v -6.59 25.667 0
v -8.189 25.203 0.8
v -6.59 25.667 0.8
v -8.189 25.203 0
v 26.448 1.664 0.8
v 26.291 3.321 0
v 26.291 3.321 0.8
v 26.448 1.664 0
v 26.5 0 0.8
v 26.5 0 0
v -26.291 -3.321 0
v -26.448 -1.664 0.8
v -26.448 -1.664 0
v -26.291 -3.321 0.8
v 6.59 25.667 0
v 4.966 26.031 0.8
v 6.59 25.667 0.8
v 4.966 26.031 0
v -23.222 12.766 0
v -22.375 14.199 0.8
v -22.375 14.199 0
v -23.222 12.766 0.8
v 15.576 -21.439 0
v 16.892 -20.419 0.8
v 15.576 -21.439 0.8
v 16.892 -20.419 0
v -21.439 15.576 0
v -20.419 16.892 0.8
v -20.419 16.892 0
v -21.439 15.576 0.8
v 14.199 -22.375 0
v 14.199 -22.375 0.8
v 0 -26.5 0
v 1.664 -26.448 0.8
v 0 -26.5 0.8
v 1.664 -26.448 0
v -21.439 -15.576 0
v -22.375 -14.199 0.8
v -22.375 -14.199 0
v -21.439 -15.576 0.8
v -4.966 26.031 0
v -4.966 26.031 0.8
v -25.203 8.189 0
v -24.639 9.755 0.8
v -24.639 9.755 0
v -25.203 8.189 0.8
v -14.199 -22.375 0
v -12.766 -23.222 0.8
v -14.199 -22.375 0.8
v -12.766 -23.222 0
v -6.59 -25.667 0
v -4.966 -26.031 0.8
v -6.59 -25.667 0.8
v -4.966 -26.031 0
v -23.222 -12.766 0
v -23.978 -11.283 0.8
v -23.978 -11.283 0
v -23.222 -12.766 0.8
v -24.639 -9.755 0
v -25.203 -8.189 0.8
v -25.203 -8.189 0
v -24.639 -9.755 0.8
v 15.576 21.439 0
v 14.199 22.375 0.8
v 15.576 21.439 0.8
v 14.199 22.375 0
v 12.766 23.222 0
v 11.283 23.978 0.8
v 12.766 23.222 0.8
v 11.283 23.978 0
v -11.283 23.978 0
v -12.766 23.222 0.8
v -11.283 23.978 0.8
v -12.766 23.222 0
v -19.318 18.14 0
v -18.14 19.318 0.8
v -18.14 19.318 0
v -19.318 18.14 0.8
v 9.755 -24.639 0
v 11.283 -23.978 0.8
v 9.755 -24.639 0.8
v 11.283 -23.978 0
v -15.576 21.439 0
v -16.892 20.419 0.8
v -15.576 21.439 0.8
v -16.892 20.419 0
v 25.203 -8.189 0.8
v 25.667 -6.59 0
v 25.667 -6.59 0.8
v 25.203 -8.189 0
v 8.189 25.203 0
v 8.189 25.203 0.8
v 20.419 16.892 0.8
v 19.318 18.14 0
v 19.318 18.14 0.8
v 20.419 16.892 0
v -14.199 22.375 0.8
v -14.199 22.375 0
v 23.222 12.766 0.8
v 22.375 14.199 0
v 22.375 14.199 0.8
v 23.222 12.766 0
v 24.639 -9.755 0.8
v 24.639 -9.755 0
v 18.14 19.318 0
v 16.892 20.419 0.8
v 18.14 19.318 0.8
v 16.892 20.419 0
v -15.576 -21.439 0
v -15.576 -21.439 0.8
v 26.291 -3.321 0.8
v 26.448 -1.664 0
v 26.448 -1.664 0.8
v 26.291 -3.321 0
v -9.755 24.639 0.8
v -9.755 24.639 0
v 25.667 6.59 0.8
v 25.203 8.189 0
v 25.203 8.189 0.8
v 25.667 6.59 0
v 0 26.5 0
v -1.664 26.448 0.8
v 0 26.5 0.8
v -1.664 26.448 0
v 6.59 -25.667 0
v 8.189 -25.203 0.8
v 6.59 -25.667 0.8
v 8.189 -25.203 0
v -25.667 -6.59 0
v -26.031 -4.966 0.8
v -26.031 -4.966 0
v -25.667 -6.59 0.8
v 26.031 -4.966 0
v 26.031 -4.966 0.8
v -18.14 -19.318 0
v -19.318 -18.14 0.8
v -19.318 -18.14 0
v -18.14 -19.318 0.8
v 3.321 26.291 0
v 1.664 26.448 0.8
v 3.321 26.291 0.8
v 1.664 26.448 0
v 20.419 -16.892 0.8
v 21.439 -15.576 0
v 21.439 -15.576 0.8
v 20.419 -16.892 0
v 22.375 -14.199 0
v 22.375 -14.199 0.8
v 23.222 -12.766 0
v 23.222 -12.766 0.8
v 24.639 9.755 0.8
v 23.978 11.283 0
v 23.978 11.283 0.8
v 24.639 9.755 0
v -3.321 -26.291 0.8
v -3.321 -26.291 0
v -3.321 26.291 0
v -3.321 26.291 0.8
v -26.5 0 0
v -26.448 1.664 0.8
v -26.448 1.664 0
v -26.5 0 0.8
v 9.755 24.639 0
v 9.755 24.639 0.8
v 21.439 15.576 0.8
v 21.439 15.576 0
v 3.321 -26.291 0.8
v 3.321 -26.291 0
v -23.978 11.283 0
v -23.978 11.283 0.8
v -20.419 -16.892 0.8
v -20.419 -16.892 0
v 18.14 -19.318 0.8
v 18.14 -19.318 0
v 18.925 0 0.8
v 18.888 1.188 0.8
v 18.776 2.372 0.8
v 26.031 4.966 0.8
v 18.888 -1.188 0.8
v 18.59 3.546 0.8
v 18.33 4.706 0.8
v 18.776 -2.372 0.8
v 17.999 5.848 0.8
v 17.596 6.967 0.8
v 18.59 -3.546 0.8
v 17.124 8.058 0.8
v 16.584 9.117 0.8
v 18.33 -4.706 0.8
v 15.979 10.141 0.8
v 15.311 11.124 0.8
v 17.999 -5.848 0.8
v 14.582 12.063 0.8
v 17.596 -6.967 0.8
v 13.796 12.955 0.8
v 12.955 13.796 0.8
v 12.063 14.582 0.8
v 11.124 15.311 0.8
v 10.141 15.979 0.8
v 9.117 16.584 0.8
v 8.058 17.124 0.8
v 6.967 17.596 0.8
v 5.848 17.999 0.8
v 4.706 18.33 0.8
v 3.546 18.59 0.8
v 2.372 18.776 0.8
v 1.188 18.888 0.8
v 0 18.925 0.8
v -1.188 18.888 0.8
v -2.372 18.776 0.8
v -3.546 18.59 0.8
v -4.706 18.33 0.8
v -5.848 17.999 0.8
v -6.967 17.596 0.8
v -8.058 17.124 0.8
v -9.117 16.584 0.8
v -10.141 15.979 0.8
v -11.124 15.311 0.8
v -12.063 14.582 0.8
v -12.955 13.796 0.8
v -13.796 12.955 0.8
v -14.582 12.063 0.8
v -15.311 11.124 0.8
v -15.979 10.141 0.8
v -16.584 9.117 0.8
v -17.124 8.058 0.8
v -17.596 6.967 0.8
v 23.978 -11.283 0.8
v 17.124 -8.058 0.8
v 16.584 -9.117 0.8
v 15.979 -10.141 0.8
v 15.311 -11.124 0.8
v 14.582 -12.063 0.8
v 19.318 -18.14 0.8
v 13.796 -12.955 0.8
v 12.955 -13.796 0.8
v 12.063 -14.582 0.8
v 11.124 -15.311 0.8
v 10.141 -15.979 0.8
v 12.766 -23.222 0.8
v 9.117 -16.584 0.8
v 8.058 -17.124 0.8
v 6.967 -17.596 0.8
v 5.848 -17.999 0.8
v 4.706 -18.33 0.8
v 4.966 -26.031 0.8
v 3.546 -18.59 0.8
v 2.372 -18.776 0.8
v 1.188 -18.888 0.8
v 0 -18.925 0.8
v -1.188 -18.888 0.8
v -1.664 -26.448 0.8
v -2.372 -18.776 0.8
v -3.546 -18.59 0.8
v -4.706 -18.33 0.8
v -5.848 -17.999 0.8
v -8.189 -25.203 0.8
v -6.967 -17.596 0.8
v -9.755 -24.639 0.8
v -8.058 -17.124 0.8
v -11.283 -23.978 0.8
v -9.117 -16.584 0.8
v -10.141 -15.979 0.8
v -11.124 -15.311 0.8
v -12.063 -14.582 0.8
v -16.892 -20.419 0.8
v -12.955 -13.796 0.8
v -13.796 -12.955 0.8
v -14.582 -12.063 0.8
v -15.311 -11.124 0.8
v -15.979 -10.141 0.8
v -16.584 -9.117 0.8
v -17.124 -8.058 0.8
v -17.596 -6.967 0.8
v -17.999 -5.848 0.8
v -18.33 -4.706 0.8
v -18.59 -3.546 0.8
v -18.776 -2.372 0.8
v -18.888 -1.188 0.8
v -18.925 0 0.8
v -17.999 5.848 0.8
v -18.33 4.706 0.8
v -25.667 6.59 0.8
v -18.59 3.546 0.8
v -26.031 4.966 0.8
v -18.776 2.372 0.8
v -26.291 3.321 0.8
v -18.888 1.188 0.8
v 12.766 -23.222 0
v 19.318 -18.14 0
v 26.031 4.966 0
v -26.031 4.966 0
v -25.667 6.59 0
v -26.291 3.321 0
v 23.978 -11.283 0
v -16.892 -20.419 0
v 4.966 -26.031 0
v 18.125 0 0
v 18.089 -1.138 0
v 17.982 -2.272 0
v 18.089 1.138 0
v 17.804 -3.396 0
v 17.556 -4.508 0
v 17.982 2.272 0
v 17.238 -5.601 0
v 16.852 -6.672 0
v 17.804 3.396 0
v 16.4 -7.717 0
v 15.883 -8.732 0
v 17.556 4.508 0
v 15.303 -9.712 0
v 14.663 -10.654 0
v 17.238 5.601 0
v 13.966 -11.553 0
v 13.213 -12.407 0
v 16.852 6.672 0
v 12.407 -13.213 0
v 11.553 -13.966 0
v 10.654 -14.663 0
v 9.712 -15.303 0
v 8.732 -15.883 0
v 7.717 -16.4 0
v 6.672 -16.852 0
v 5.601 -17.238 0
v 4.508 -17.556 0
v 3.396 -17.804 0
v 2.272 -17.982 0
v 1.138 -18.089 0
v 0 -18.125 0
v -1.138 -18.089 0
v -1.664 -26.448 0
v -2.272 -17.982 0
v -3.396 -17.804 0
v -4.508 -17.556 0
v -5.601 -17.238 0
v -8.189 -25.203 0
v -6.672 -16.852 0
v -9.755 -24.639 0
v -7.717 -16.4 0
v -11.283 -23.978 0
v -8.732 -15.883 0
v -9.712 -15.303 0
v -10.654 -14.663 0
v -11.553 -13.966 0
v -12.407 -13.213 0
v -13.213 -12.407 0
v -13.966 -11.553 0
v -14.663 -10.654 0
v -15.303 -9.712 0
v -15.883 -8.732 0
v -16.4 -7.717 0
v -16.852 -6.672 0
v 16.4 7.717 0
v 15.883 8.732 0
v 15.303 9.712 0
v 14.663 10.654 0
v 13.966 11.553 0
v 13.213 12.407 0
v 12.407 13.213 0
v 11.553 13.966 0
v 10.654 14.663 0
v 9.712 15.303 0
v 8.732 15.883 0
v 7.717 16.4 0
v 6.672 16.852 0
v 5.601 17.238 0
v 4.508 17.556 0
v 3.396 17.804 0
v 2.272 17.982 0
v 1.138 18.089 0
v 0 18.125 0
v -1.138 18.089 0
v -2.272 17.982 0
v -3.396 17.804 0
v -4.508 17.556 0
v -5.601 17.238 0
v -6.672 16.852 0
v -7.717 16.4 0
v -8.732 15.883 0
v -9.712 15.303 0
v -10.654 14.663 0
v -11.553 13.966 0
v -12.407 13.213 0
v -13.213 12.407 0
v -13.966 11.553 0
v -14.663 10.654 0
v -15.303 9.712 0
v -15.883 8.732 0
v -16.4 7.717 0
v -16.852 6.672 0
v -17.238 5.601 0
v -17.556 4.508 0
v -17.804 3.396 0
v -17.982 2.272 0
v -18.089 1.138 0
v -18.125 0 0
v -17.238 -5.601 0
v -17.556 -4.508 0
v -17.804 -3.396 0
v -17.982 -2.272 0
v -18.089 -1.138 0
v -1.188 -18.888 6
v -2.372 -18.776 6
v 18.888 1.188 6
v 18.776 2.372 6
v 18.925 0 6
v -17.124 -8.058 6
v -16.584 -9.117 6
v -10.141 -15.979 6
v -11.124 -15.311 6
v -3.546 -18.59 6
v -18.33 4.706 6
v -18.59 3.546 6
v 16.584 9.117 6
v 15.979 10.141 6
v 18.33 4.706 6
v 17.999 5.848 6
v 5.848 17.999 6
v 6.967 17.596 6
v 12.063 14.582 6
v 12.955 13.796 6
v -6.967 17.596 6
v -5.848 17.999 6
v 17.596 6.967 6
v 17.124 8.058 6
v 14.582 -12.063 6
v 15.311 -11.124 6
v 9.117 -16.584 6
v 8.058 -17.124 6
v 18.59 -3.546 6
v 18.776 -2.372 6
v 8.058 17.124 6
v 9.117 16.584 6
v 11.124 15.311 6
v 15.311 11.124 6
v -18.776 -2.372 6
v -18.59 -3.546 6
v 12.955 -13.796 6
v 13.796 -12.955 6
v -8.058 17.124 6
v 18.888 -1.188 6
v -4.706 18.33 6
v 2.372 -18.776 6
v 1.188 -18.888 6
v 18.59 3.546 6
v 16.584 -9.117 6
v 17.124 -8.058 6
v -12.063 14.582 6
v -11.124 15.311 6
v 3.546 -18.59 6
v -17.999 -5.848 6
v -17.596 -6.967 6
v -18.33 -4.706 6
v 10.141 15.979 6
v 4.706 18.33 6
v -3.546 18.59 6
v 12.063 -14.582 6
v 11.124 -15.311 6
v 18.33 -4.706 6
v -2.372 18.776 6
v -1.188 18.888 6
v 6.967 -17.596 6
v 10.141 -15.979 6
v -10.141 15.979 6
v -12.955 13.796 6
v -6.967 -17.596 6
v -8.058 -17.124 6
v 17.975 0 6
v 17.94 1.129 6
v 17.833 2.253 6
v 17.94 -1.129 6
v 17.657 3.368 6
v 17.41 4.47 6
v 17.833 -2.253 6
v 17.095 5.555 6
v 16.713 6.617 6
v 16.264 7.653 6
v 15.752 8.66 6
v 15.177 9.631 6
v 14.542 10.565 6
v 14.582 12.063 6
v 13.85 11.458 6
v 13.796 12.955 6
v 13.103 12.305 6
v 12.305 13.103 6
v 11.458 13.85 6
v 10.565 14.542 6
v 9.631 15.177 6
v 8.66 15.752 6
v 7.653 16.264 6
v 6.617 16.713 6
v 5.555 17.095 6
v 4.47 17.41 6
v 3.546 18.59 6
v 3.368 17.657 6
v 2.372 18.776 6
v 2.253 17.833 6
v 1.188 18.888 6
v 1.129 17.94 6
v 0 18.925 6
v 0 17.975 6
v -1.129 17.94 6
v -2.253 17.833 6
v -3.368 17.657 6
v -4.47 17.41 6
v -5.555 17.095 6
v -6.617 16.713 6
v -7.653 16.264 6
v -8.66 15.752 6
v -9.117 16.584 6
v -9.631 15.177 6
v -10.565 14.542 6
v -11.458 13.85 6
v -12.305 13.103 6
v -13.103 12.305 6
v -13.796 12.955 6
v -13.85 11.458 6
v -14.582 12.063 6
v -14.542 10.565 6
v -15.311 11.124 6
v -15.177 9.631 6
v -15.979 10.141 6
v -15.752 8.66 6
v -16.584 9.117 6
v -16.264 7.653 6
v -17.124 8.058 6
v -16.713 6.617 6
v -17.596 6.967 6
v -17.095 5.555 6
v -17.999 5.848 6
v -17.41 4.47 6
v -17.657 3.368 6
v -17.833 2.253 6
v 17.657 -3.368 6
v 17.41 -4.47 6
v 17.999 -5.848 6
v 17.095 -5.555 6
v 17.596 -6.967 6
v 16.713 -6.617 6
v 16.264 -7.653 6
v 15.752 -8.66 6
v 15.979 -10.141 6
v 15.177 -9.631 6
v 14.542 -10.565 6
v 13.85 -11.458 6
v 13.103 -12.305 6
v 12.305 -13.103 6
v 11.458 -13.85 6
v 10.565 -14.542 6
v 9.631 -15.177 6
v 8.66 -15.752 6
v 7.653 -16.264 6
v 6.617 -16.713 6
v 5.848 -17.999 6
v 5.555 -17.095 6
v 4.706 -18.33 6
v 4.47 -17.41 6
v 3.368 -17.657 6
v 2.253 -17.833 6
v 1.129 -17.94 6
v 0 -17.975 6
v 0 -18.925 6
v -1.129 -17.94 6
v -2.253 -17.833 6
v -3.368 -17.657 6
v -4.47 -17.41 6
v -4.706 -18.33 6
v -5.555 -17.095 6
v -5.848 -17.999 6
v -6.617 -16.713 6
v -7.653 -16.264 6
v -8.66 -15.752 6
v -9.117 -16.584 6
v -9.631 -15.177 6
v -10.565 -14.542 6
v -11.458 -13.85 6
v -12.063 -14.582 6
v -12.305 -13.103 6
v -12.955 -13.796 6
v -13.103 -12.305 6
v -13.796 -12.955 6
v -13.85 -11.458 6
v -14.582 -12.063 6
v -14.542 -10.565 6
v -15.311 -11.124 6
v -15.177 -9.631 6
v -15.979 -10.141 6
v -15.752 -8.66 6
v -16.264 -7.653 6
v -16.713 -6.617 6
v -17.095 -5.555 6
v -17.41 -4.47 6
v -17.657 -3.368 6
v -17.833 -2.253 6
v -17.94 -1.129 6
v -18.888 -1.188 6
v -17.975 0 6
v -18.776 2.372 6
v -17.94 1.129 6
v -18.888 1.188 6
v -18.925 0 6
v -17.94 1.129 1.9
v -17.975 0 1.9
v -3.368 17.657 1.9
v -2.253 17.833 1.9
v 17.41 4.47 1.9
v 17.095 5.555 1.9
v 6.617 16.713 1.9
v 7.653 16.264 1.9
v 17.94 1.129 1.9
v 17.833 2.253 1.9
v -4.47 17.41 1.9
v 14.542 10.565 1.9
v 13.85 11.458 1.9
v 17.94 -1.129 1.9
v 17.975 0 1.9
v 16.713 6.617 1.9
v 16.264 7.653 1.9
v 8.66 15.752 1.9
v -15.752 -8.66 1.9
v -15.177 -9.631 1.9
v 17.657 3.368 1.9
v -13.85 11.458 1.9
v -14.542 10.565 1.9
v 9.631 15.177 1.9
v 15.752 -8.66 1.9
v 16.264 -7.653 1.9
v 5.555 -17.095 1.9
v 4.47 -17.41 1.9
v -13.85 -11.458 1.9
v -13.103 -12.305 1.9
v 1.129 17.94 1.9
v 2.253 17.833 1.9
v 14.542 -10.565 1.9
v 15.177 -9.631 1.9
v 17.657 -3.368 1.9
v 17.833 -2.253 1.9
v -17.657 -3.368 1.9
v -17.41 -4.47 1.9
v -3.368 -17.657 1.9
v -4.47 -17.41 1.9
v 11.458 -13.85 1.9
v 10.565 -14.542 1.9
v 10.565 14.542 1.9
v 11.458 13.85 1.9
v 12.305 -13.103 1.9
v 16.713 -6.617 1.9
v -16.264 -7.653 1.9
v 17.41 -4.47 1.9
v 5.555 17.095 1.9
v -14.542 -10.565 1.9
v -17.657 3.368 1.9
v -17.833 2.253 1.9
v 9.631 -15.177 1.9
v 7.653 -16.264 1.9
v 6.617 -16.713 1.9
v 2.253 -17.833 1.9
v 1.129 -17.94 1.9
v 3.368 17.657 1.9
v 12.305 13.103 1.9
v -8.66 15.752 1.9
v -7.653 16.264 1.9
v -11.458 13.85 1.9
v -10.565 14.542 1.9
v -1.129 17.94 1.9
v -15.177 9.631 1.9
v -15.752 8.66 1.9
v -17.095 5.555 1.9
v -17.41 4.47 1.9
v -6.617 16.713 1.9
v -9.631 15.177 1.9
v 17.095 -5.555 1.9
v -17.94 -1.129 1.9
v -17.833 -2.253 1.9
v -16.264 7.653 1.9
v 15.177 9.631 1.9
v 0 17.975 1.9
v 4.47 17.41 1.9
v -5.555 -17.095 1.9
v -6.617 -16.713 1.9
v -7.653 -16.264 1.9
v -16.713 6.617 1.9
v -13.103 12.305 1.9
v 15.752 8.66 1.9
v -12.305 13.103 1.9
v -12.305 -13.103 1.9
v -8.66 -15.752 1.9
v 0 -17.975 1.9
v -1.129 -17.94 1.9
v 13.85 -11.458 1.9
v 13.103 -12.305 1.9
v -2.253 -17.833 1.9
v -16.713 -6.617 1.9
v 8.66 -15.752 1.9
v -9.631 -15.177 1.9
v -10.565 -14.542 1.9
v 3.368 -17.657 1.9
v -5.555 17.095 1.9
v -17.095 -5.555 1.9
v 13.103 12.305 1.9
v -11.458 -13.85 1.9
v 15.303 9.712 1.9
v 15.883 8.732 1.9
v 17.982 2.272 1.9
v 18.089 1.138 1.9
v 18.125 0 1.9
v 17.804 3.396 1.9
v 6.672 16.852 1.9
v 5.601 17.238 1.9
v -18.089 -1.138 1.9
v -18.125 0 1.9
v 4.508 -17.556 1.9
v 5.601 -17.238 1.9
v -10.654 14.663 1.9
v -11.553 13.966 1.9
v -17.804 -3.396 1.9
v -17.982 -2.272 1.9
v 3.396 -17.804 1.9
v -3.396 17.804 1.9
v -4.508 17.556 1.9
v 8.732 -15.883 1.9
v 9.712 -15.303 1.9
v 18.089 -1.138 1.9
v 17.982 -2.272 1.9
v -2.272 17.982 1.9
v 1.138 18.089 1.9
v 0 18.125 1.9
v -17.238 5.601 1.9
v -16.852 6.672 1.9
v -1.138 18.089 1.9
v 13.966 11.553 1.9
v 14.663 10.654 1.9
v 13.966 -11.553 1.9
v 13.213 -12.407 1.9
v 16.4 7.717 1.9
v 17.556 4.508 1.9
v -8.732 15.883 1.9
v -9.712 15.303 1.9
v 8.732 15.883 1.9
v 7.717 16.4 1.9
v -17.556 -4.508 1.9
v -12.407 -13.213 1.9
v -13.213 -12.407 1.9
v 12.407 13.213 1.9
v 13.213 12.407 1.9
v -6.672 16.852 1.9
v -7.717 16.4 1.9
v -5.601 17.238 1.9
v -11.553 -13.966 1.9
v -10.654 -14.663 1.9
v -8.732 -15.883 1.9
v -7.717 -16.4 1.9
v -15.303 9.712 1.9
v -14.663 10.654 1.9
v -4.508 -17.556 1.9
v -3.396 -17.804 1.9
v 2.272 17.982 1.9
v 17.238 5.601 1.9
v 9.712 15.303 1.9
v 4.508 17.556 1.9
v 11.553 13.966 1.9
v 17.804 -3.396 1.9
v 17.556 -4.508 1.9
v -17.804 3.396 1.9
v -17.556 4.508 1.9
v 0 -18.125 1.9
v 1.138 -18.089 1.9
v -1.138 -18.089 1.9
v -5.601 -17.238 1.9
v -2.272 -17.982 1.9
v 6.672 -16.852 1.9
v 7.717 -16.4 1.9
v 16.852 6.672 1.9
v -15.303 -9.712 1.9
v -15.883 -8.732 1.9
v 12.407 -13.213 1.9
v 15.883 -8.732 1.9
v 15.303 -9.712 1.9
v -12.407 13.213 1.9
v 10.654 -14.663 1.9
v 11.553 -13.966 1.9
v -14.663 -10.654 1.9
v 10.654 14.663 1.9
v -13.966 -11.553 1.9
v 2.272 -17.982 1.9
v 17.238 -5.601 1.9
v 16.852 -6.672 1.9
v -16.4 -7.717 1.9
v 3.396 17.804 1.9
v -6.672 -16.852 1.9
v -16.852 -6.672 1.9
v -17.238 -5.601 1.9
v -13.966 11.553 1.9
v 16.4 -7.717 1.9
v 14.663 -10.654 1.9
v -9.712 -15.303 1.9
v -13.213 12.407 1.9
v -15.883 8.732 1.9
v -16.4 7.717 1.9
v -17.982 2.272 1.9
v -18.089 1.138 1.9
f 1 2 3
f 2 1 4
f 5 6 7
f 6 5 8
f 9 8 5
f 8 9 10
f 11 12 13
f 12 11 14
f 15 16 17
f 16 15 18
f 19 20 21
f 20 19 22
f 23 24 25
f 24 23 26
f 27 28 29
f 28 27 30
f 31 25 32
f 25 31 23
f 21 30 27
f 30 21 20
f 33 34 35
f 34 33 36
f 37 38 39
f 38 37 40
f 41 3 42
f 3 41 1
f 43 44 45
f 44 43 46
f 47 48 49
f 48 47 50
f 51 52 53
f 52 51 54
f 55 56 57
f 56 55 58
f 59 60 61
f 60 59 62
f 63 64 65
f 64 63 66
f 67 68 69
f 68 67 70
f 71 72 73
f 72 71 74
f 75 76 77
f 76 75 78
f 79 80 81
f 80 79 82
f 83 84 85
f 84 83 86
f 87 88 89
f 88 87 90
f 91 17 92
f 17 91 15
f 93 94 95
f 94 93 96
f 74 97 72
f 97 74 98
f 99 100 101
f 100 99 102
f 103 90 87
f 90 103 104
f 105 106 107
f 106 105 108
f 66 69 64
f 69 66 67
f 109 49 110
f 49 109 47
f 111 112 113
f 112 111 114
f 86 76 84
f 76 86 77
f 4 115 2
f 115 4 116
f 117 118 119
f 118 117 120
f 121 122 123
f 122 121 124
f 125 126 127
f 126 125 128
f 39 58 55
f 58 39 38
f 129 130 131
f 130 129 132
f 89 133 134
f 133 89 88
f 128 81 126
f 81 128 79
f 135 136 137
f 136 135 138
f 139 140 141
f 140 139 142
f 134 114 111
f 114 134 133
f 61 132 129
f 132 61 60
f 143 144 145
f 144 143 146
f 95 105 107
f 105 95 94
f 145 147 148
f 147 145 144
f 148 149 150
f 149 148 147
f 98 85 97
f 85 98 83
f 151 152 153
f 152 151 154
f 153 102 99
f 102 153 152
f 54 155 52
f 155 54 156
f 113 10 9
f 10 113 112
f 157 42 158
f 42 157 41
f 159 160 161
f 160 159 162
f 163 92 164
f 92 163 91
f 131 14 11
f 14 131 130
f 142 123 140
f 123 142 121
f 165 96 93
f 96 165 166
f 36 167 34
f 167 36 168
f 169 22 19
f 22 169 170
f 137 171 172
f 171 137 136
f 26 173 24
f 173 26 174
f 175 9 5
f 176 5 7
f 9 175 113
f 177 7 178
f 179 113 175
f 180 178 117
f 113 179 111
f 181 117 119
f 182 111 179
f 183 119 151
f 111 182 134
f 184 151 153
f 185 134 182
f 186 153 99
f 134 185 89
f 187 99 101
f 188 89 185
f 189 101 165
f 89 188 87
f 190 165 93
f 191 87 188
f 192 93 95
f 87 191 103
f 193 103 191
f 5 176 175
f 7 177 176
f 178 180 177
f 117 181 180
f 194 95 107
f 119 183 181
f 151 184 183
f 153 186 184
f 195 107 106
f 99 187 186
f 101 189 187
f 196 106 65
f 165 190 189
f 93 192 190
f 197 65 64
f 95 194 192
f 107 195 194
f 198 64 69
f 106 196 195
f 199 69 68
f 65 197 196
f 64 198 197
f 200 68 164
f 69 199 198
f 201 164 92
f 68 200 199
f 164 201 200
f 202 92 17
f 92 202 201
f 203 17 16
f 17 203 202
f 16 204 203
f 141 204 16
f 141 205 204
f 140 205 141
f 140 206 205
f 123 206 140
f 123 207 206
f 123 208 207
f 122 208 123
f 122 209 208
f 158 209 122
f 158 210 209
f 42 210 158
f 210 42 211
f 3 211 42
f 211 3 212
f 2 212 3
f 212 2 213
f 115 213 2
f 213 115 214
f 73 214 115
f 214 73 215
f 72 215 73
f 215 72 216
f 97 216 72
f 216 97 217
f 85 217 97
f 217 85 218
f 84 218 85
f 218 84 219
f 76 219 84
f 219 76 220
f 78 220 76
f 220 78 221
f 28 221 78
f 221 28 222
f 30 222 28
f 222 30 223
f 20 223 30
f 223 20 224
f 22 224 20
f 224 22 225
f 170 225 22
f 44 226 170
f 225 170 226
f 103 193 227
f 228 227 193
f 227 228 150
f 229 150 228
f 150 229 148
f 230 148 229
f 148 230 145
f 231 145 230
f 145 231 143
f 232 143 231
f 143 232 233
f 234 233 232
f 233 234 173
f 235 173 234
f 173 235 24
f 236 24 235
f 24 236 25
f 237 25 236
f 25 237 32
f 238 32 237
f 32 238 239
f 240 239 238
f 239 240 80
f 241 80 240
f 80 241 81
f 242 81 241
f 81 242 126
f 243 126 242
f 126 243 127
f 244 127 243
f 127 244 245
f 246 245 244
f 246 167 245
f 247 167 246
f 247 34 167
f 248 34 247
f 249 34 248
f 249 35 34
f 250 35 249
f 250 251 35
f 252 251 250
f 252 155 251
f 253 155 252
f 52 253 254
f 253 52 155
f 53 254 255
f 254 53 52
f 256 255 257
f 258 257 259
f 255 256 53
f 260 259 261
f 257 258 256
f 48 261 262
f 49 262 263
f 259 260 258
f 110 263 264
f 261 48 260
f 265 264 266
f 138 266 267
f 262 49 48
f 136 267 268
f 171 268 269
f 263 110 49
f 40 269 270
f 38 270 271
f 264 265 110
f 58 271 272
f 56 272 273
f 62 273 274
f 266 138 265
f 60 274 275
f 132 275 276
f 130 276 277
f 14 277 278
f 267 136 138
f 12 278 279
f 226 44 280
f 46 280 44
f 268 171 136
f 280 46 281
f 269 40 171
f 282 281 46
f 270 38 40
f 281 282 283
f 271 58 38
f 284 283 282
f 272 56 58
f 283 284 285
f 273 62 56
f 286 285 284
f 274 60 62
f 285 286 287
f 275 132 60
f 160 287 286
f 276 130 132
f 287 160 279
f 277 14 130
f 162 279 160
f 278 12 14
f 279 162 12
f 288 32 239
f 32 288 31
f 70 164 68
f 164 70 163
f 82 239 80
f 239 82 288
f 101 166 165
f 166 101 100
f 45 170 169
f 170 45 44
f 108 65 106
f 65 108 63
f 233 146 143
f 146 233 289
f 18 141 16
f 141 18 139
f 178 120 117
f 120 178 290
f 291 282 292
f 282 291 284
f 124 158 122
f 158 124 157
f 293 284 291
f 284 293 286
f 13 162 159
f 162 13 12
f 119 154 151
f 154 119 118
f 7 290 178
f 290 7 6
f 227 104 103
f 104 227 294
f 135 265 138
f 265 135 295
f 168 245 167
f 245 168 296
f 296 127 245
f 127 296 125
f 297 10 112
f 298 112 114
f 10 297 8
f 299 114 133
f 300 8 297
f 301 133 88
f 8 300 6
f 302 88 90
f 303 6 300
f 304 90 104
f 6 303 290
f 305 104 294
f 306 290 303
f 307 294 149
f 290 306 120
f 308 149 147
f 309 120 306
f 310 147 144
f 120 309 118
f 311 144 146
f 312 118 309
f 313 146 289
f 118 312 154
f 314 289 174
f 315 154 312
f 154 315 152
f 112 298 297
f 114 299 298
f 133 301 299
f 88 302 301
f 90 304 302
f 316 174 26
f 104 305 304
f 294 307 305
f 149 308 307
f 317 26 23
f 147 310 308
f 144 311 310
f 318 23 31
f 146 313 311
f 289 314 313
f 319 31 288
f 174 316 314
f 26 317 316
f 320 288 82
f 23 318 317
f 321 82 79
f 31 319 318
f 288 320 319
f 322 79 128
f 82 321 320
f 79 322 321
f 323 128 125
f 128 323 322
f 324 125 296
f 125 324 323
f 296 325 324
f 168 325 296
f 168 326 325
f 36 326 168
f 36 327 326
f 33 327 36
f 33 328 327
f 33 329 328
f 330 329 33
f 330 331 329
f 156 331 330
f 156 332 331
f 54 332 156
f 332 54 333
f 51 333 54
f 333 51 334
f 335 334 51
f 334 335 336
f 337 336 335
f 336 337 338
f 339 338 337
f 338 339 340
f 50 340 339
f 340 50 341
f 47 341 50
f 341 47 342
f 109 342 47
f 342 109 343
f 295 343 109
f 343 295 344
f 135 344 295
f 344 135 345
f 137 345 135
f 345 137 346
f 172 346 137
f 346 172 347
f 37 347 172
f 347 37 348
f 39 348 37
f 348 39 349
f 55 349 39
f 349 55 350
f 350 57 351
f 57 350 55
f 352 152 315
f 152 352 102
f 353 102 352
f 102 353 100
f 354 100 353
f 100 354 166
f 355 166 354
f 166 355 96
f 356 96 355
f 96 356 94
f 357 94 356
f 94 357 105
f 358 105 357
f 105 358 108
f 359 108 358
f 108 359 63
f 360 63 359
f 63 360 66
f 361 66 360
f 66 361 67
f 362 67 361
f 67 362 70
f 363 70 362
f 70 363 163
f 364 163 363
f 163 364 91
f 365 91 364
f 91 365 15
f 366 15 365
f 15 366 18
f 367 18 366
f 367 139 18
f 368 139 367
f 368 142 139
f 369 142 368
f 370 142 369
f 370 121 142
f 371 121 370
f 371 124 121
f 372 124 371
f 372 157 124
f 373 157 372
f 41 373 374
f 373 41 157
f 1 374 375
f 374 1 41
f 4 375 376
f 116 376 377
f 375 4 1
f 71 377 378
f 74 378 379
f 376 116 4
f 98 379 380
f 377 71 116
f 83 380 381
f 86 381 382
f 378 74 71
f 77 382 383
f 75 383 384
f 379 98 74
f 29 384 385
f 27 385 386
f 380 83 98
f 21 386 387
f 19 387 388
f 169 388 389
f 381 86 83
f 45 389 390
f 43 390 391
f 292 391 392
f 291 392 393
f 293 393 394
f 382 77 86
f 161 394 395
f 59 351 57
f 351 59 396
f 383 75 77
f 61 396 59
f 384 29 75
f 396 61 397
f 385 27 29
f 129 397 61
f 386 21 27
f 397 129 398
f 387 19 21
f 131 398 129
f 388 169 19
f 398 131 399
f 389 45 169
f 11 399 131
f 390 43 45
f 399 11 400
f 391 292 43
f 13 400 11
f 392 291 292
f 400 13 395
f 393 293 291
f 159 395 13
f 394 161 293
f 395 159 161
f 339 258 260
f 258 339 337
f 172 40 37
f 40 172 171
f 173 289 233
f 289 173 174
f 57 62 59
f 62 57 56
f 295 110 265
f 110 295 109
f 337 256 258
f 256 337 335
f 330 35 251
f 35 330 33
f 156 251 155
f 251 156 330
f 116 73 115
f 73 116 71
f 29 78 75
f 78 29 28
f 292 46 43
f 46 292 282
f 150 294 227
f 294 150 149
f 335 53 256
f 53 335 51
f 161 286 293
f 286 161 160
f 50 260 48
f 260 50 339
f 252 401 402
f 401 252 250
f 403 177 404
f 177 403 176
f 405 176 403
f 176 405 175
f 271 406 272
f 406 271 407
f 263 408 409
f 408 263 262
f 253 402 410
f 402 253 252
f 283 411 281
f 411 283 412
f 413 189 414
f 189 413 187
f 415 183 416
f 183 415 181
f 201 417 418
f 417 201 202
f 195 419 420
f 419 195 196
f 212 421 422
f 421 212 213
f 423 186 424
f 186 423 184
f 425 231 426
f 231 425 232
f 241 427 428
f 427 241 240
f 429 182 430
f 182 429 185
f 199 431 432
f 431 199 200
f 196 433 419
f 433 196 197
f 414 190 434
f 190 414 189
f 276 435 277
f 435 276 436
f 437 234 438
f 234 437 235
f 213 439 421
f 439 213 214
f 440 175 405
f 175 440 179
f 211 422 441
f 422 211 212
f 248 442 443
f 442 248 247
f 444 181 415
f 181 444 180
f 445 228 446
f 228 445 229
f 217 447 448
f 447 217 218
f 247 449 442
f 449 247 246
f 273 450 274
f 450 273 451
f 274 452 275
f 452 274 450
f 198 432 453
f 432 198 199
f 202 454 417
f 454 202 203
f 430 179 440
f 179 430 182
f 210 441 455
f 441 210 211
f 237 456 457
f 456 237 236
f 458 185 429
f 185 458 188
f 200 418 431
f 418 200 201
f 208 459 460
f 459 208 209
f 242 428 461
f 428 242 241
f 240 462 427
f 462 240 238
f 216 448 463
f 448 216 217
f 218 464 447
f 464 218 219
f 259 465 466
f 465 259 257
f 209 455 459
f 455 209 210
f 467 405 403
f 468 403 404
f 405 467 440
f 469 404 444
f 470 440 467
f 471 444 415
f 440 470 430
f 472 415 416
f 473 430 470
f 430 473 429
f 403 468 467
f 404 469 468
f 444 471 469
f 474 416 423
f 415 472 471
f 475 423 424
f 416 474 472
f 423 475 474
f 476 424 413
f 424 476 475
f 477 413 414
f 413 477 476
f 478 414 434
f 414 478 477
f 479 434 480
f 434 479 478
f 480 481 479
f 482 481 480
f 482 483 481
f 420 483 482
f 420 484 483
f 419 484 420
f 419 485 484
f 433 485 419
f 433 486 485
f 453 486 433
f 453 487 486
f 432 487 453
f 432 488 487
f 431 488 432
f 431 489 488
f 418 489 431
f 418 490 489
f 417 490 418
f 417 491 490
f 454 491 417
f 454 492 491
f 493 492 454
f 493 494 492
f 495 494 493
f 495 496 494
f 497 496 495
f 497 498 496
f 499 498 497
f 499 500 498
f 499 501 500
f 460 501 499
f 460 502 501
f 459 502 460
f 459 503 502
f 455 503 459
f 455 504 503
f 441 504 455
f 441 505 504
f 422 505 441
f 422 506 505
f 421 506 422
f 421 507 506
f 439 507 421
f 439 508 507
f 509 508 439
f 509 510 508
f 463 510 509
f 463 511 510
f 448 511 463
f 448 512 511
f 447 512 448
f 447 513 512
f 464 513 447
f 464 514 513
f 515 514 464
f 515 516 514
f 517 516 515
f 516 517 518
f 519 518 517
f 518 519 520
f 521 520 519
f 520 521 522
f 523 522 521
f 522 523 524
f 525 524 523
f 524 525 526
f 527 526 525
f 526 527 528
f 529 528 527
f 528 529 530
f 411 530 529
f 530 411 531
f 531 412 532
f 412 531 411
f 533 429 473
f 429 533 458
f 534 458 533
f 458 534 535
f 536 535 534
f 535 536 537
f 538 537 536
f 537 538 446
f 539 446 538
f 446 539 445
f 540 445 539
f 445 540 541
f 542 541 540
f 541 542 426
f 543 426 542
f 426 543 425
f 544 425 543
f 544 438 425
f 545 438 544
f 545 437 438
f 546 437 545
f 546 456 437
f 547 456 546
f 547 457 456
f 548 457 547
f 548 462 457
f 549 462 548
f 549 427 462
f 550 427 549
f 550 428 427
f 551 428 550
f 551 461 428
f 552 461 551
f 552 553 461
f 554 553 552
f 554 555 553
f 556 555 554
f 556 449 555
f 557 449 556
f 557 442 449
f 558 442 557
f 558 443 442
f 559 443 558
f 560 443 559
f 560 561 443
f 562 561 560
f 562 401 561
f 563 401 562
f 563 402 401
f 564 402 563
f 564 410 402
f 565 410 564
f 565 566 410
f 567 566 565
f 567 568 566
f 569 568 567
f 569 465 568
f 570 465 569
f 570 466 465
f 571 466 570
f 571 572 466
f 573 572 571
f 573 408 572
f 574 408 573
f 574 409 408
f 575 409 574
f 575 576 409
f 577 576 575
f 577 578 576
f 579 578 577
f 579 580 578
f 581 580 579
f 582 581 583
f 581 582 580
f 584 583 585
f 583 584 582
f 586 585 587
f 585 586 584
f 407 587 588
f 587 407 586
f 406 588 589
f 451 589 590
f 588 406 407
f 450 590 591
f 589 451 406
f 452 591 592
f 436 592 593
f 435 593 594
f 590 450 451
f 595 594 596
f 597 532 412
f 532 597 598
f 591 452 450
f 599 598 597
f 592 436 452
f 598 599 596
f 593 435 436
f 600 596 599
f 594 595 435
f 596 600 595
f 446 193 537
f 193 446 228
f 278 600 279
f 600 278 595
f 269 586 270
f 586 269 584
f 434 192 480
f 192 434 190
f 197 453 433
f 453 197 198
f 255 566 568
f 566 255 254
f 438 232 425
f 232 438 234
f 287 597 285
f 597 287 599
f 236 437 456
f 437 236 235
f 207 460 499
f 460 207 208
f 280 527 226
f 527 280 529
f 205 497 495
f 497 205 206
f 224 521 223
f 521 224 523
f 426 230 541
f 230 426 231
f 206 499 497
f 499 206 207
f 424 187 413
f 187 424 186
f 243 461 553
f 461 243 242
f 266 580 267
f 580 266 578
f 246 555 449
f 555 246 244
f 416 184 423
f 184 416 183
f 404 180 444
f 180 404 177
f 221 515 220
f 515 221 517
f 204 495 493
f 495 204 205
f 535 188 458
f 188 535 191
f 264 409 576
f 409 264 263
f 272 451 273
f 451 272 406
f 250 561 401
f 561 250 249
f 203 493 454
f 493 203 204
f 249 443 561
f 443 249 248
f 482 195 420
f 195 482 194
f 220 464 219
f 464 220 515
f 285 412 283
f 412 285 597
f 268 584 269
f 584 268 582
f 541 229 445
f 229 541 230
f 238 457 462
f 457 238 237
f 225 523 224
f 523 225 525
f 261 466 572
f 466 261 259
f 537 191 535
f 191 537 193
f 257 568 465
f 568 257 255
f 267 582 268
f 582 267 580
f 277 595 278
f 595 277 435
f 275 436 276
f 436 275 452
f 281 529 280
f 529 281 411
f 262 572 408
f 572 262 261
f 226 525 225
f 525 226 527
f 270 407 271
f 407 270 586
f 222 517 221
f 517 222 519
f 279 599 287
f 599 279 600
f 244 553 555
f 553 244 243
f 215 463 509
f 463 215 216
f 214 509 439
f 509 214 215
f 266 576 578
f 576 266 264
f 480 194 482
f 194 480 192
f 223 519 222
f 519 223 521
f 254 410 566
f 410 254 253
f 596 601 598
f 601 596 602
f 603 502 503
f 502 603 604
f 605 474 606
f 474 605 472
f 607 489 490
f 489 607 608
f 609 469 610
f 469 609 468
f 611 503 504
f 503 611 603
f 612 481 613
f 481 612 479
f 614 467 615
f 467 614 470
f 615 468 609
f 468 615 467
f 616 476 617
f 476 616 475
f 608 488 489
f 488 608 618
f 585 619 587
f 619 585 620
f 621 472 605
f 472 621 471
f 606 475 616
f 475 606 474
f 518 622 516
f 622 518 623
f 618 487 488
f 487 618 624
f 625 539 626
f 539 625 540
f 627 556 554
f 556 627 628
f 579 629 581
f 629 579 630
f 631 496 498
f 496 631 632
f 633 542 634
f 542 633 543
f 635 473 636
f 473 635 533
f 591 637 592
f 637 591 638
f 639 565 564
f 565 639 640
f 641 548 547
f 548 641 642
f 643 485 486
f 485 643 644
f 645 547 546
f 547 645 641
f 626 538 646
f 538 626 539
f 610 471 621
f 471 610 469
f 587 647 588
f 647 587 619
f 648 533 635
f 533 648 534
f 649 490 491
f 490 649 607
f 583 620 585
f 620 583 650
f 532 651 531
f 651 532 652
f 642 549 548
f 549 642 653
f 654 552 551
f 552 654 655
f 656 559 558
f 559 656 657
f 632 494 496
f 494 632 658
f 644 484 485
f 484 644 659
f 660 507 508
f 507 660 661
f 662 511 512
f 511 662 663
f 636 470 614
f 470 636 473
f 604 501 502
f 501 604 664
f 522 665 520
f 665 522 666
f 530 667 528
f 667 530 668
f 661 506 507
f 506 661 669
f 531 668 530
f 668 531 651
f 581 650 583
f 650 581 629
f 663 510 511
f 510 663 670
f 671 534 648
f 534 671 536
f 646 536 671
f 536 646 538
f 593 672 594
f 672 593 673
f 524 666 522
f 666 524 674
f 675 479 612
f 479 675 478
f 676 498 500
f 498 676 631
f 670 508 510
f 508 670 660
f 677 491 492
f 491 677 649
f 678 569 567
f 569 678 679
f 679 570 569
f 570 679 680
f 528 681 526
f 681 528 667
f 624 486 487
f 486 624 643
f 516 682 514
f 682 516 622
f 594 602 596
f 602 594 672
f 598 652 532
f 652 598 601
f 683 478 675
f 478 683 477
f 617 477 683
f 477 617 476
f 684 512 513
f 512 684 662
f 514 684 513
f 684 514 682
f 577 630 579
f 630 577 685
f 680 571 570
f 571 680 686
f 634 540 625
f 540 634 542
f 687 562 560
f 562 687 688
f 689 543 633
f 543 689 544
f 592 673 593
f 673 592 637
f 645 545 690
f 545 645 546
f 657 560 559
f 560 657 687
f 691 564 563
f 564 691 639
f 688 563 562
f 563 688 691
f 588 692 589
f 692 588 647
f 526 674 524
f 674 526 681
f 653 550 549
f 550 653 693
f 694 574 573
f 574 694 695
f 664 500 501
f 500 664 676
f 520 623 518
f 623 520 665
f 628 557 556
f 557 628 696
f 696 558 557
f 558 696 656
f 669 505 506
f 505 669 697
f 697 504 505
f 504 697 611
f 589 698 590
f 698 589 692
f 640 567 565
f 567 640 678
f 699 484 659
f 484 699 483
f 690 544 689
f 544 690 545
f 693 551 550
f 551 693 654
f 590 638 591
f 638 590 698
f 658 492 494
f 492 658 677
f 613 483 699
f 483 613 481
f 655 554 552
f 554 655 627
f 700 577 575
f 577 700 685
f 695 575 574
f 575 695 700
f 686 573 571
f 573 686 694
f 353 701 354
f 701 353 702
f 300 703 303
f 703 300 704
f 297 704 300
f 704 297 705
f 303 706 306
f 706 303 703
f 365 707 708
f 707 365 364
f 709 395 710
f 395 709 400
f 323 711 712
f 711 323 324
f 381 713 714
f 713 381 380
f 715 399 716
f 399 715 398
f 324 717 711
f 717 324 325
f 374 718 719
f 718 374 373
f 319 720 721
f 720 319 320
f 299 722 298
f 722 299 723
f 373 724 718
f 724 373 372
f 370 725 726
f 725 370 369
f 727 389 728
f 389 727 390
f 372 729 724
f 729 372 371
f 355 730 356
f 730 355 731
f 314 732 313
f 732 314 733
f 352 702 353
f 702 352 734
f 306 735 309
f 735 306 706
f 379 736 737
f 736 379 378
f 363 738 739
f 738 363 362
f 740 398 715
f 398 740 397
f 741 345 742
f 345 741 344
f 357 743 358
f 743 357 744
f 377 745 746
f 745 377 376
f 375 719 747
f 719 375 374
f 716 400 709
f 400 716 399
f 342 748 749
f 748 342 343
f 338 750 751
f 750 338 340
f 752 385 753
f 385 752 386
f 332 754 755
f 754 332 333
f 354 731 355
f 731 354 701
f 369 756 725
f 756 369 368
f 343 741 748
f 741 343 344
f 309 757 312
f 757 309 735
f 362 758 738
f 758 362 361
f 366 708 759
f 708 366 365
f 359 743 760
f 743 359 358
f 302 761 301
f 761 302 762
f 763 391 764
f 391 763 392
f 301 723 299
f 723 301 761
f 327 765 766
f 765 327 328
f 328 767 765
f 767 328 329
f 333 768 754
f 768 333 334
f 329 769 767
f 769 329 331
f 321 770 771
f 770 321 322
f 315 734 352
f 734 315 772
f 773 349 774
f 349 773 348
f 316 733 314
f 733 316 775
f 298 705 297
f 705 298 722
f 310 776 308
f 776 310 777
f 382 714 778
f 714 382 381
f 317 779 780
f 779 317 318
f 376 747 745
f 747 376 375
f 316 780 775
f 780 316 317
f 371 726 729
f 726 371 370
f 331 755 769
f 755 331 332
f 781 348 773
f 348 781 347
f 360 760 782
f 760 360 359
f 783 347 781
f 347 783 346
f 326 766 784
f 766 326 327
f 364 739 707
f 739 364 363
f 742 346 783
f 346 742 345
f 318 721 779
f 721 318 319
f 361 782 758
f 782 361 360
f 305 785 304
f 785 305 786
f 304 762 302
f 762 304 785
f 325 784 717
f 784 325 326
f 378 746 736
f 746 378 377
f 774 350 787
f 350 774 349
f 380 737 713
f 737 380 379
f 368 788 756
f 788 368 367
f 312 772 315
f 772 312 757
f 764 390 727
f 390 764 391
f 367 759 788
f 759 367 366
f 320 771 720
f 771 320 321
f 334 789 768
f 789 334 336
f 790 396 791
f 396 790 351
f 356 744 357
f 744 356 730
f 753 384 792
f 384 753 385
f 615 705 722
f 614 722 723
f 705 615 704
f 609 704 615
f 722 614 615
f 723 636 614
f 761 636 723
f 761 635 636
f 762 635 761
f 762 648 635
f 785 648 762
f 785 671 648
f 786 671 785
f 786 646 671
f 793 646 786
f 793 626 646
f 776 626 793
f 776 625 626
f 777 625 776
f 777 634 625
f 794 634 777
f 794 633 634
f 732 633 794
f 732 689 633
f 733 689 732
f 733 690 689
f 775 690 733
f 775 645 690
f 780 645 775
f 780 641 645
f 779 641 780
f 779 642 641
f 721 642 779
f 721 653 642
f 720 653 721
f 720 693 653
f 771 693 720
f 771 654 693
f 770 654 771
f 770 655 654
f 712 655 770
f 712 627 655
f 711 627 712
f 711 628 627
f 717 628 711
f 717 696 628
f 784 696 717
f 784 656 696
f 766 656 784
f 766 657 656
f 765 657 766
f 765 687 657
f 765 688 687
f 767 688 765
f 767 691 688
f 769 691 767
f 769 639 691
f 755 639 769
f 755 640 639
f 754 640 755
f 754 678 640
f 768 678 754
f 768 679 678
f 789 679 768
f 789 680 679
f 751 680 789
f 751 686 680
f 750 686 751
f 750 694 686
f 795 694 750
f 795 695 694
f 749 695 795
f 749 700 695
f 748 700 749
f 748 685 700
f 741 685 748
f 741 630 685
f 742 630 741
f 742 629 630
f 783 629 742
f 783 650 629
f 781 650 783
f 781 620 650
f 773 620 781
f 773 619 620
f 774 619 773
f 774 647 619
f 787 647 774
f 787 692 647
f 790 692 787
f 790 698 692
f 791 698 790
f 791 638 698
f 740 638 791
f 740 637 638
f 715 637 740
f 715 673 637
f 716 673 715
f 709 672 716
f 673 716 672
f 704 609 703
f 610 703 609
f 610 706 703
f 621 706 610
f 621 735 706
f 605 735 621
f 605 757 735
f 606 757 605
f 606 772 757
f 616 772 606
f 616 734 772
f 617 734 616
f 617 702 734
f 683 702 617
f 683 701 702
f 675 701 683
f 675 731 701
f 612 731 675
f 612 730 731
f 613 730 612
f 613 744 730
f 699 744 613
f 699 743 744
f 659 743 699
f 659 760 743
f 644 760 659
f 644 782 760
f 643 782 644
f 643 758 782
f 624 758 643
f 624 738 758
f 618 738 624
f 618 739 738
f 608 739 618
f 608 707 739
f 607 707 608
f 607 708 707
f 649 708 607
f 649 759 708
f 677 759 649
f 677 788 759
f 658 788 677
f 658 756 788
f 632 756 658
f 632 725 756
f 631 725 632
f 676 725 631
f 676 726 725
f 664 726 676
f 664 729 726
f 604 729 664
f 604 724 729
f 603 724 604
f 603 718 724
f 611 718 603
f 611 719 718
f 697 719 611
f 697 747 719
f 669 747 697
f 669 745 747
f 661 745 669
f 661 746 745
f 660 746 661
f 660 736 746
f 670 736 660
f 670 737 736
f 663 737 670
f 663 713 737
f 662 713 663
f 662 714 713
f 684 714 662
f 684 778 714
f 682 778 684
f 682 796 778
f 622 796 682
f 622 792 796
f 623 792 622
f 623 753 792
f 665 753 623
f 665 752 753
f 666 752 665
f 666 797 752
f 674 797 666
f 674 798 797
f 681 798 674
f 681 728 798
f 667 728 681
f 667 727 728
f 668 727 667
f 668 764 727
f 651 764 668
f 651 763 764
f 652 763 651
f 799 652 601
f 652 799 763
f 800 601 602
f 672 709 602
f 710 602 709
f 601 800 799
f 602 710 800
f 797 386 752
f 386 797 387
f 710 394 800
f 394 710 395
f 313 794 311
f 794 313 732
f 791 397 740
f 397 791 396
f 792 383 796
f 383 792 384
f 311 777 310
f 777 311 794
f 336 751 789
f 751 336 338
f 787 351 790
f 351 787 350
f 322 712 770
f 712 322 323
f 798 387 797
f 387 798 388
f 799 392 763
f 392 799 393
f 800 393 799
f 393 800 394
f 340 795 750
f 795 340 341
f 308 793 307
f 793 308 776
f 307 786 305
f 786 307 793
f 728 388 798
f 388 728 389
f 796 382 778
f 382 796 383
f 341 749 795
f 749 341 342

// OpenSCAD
$fn = 100;

difference() {
  union() {
    cylinder(d = 53, h = 0.8);
    cylinder(d = 35.85 + 2, h = 6);
  }

  translate([0, 0, -0.1]) {
    cylinder(d = 35.85 + 0.1, h = 10);
    cylinder(d = 35.85 + 0.4, h = 2);
  }
}
